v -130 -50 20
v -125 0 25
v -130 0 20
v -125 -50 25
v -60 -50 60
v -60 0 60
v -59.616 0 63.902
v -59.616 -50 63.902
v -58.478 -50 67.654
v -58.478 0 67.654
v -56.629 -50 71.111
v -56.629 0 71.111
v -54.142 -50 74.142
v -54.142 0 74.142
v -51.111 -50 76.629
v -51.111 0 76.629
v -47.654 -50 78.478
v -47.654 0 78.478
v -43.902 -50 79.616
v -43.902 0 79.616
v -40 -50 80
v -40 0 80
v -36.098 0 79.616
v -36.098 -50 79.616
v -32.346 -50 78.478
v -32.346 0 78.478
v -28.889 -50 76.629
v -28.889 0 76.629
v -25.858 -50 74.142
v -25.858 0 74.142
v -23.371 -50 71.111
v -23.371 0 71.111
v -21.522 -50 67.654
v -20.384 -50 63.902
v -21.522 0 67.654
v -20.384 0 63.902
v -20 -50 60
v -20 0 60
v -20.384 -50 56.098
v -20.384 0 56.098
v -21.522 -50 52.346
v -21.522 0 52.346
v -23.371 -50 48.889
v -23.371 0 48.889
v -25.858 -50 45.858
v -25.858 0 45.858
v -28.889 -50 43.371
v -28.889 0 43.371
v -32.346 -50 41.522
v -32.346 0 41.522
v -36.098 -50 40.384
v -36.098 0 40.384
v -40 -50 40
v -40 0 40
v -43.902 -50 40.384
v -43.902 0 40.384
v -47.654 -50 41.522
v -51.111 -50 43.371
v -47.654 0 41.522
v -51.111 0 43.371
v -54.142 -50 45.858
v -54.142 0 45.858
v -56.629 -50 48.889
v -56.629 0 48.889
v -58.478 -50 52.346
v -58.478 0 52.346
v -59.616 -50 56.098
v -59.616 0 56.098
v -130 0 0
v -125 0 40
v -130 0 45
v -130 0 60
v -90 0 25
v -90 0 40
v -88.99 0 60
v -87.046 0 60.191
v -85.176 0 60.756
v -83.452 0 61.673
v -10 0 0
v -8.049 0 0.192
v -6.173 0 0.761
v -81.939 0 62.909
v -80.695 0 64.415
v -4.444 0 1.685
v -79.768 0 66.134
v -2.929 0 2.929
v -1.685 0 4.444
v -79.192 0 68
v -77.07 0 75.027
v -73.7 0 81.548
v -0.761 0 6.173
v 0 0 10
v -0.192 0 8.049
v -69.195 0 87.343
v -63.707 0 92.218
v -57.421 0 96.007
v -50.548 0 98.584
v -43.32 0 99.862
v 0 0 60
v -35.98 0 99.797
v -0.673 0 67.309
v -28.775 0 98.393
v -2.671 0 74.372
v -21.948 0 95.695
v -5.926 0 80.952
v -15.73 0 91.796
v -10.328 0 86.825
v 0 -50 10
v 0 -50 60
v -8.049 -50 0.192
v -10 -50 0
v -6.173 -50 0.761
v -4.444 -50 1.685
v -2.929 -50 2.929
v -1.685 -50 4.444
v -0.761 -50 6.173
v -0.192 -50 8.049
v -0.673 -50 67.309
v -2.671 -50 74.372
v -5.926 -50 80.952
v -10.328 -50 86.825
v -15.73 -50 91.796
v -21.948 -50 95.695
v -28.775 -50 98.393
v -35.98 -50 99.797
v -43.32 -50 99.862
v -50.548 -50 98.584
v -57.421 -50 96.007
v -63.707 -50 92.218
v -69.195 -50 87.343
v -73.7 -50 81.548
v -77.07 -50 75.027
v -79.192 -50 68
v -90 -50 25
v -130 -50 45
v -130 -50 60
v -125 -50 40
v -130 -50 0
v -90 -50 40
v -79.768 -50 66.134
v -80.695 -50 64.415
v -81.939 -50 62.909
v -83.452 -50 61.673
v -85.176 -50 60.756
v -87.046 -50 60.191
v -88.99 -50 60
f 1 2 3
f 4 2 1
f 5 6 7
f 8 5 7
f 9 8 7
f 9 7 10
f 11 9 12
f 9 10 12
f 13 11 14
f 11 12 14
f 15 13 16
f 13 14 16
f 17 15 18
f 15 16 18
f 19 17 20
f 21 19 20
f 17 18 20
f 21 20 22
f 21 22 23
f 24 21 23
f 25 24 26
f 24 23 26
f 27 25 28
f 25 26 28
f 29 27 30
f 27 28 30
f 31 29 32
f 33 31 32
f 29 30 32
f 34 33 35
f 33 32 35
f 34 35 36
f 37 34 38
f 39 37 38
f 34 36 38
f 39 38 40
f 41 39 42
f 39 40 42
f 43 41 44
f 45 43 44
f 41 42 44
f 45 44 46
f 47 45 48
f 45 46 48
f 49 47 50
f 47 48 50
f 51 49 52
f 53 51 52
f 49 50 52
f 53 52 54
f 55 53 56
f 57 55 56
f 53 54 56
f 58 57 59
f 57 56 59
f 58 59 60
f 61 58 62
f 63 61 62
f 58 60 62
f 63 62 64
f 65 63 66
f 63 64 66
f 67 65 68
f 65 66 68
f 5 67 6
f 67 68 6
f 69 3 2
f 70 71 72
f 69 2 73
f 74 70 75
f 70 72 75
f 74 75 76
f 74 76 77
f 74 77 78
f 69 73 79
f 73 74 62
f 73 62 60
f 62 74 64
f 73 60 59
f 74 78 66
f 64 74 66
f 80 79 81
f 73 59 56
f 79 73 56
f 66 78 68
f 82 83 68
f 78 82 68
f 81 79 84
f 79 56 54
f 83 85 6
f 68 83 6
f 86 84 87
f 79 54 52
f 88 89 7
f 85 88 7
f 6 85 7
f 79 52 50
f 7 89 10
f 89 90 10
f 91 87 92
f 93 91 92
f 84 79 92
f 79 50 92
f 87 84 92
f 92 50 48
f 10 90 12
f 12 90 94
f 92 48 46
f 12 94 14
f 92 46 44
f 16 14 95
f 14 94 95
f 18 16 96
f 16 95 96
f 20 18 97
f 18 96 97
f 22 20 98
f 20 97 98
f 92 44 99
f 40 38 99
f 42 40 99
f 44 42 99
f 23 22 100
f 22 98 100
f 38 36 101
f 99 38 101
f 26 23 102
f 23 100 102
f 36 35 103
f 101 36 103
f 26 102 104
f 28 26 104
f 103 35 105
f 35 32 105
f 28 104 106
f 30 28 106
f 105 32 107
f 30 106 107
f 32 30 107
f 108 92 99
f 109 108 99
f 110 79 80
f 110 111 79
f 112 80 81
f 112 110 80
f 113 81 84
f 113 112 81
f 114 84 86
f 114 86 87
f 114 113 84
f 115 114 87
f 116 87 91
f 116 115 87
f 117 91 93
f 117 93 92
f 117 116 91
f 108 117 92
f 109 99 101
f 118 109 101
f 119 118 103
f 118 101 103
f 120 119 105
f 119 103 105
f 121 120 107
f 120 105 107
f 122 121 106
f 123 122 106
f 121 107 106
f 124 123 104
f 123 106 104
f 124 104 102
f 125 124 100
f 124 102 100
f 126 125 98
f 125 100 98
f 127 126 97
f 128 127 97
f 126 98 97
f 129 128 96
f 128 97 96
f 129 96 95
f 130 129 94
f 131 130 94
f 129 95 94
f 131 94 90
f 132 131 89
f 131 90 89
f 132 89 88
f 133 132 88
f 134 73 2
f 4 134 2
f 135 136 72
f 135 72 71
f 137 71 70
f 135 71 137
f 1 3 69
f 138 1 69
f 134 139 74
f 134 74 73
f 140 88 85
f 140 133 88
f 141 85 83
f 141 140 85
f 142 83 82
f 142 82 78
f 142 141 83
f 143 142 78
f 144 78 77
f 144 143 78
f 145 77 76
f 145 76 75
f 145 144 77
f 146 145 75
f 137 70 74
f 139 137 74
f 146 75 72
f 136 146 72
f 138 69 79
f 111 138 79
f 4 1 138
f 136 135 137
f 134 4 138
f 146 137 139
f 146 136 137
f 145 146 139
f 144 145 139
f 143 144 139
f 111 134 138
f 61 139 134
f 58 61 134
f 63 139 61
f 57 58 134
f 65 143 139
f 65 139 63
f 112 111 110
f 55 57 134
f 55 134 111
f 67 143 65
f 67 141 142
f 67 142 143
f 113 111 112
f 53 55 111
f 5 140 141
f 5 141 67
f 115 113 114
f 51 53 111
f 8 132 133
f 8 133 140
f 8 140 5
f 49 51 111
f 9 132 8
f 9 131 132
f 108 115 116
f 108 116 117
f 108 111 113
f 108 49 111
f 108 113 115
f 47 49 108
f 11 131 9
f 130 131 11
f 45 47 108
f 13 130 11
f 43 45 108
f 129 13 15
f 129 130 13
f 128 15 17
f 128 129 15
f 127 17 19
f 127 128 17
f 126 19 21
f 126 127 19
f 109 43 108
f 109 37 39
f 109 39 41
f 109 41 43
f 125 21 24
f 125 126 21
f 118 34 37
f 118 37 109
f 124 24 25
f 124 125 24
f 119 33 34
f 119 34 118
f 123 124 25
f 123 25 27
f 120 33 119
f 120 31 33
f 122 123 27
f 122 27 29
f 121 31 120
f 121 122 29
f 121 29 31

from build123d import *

# Parameters (mm, degrees)
F1_DEPTH = 50
F2_R     = 10
F3_SIZE  = 5


with BuildPart() as f1:
    # F0 (on Front) → F1 (new body)
    with BuildSketch(Plane.XZ):
        with BuildLine():
            Line((-130, 0), (0, 0))
            Line((0, 0), (0, 60))
            Line((0, 60), (-20, 60))
            ThreePointArc((-20, 60), (-40, 40), (-60, 60))
            Line((-60, 60), (-80, 60))
            Line((-80, 60), (-130, 60))
            Line((-130, 60), (-130, 40))
            Line((-130, 40), (-90, 40))
            Line((-90, 40), (-90, 25))
            Line((-90, 25), (-130, 25))
            Line((-130, 25), (-130, 0))
        make_face()
        with BuildLine():
            Line((-20, 60), (0, 60))
            ThreePointArc((0, 60), (-40, 100), (-80, 60))
            Line((-80, 60), (-60, 60))
            ThreePointArc((-60, 60), (-40, 80), (-20, 60))
        make_face()
    extrude(amount=F1_DEPTH)

    # F2
    f2_edges = [f1.edges().sort_by_distance(p)[0] for p in [
        (0, -25, 60),
        (0, -25, 0),
        (-80, -25, 60),
    ]]
    fillet(f2_edges, radius=F2_R)

    # F3
    f3_edges = [f1.edges().sort_by_distance(p)[0] for p in [
        (-130, -25, 40),
        (-130, -25, 25),
    ]]
    chamfer(f3_edges, length=F3_SIZE)


solid = f1.part
